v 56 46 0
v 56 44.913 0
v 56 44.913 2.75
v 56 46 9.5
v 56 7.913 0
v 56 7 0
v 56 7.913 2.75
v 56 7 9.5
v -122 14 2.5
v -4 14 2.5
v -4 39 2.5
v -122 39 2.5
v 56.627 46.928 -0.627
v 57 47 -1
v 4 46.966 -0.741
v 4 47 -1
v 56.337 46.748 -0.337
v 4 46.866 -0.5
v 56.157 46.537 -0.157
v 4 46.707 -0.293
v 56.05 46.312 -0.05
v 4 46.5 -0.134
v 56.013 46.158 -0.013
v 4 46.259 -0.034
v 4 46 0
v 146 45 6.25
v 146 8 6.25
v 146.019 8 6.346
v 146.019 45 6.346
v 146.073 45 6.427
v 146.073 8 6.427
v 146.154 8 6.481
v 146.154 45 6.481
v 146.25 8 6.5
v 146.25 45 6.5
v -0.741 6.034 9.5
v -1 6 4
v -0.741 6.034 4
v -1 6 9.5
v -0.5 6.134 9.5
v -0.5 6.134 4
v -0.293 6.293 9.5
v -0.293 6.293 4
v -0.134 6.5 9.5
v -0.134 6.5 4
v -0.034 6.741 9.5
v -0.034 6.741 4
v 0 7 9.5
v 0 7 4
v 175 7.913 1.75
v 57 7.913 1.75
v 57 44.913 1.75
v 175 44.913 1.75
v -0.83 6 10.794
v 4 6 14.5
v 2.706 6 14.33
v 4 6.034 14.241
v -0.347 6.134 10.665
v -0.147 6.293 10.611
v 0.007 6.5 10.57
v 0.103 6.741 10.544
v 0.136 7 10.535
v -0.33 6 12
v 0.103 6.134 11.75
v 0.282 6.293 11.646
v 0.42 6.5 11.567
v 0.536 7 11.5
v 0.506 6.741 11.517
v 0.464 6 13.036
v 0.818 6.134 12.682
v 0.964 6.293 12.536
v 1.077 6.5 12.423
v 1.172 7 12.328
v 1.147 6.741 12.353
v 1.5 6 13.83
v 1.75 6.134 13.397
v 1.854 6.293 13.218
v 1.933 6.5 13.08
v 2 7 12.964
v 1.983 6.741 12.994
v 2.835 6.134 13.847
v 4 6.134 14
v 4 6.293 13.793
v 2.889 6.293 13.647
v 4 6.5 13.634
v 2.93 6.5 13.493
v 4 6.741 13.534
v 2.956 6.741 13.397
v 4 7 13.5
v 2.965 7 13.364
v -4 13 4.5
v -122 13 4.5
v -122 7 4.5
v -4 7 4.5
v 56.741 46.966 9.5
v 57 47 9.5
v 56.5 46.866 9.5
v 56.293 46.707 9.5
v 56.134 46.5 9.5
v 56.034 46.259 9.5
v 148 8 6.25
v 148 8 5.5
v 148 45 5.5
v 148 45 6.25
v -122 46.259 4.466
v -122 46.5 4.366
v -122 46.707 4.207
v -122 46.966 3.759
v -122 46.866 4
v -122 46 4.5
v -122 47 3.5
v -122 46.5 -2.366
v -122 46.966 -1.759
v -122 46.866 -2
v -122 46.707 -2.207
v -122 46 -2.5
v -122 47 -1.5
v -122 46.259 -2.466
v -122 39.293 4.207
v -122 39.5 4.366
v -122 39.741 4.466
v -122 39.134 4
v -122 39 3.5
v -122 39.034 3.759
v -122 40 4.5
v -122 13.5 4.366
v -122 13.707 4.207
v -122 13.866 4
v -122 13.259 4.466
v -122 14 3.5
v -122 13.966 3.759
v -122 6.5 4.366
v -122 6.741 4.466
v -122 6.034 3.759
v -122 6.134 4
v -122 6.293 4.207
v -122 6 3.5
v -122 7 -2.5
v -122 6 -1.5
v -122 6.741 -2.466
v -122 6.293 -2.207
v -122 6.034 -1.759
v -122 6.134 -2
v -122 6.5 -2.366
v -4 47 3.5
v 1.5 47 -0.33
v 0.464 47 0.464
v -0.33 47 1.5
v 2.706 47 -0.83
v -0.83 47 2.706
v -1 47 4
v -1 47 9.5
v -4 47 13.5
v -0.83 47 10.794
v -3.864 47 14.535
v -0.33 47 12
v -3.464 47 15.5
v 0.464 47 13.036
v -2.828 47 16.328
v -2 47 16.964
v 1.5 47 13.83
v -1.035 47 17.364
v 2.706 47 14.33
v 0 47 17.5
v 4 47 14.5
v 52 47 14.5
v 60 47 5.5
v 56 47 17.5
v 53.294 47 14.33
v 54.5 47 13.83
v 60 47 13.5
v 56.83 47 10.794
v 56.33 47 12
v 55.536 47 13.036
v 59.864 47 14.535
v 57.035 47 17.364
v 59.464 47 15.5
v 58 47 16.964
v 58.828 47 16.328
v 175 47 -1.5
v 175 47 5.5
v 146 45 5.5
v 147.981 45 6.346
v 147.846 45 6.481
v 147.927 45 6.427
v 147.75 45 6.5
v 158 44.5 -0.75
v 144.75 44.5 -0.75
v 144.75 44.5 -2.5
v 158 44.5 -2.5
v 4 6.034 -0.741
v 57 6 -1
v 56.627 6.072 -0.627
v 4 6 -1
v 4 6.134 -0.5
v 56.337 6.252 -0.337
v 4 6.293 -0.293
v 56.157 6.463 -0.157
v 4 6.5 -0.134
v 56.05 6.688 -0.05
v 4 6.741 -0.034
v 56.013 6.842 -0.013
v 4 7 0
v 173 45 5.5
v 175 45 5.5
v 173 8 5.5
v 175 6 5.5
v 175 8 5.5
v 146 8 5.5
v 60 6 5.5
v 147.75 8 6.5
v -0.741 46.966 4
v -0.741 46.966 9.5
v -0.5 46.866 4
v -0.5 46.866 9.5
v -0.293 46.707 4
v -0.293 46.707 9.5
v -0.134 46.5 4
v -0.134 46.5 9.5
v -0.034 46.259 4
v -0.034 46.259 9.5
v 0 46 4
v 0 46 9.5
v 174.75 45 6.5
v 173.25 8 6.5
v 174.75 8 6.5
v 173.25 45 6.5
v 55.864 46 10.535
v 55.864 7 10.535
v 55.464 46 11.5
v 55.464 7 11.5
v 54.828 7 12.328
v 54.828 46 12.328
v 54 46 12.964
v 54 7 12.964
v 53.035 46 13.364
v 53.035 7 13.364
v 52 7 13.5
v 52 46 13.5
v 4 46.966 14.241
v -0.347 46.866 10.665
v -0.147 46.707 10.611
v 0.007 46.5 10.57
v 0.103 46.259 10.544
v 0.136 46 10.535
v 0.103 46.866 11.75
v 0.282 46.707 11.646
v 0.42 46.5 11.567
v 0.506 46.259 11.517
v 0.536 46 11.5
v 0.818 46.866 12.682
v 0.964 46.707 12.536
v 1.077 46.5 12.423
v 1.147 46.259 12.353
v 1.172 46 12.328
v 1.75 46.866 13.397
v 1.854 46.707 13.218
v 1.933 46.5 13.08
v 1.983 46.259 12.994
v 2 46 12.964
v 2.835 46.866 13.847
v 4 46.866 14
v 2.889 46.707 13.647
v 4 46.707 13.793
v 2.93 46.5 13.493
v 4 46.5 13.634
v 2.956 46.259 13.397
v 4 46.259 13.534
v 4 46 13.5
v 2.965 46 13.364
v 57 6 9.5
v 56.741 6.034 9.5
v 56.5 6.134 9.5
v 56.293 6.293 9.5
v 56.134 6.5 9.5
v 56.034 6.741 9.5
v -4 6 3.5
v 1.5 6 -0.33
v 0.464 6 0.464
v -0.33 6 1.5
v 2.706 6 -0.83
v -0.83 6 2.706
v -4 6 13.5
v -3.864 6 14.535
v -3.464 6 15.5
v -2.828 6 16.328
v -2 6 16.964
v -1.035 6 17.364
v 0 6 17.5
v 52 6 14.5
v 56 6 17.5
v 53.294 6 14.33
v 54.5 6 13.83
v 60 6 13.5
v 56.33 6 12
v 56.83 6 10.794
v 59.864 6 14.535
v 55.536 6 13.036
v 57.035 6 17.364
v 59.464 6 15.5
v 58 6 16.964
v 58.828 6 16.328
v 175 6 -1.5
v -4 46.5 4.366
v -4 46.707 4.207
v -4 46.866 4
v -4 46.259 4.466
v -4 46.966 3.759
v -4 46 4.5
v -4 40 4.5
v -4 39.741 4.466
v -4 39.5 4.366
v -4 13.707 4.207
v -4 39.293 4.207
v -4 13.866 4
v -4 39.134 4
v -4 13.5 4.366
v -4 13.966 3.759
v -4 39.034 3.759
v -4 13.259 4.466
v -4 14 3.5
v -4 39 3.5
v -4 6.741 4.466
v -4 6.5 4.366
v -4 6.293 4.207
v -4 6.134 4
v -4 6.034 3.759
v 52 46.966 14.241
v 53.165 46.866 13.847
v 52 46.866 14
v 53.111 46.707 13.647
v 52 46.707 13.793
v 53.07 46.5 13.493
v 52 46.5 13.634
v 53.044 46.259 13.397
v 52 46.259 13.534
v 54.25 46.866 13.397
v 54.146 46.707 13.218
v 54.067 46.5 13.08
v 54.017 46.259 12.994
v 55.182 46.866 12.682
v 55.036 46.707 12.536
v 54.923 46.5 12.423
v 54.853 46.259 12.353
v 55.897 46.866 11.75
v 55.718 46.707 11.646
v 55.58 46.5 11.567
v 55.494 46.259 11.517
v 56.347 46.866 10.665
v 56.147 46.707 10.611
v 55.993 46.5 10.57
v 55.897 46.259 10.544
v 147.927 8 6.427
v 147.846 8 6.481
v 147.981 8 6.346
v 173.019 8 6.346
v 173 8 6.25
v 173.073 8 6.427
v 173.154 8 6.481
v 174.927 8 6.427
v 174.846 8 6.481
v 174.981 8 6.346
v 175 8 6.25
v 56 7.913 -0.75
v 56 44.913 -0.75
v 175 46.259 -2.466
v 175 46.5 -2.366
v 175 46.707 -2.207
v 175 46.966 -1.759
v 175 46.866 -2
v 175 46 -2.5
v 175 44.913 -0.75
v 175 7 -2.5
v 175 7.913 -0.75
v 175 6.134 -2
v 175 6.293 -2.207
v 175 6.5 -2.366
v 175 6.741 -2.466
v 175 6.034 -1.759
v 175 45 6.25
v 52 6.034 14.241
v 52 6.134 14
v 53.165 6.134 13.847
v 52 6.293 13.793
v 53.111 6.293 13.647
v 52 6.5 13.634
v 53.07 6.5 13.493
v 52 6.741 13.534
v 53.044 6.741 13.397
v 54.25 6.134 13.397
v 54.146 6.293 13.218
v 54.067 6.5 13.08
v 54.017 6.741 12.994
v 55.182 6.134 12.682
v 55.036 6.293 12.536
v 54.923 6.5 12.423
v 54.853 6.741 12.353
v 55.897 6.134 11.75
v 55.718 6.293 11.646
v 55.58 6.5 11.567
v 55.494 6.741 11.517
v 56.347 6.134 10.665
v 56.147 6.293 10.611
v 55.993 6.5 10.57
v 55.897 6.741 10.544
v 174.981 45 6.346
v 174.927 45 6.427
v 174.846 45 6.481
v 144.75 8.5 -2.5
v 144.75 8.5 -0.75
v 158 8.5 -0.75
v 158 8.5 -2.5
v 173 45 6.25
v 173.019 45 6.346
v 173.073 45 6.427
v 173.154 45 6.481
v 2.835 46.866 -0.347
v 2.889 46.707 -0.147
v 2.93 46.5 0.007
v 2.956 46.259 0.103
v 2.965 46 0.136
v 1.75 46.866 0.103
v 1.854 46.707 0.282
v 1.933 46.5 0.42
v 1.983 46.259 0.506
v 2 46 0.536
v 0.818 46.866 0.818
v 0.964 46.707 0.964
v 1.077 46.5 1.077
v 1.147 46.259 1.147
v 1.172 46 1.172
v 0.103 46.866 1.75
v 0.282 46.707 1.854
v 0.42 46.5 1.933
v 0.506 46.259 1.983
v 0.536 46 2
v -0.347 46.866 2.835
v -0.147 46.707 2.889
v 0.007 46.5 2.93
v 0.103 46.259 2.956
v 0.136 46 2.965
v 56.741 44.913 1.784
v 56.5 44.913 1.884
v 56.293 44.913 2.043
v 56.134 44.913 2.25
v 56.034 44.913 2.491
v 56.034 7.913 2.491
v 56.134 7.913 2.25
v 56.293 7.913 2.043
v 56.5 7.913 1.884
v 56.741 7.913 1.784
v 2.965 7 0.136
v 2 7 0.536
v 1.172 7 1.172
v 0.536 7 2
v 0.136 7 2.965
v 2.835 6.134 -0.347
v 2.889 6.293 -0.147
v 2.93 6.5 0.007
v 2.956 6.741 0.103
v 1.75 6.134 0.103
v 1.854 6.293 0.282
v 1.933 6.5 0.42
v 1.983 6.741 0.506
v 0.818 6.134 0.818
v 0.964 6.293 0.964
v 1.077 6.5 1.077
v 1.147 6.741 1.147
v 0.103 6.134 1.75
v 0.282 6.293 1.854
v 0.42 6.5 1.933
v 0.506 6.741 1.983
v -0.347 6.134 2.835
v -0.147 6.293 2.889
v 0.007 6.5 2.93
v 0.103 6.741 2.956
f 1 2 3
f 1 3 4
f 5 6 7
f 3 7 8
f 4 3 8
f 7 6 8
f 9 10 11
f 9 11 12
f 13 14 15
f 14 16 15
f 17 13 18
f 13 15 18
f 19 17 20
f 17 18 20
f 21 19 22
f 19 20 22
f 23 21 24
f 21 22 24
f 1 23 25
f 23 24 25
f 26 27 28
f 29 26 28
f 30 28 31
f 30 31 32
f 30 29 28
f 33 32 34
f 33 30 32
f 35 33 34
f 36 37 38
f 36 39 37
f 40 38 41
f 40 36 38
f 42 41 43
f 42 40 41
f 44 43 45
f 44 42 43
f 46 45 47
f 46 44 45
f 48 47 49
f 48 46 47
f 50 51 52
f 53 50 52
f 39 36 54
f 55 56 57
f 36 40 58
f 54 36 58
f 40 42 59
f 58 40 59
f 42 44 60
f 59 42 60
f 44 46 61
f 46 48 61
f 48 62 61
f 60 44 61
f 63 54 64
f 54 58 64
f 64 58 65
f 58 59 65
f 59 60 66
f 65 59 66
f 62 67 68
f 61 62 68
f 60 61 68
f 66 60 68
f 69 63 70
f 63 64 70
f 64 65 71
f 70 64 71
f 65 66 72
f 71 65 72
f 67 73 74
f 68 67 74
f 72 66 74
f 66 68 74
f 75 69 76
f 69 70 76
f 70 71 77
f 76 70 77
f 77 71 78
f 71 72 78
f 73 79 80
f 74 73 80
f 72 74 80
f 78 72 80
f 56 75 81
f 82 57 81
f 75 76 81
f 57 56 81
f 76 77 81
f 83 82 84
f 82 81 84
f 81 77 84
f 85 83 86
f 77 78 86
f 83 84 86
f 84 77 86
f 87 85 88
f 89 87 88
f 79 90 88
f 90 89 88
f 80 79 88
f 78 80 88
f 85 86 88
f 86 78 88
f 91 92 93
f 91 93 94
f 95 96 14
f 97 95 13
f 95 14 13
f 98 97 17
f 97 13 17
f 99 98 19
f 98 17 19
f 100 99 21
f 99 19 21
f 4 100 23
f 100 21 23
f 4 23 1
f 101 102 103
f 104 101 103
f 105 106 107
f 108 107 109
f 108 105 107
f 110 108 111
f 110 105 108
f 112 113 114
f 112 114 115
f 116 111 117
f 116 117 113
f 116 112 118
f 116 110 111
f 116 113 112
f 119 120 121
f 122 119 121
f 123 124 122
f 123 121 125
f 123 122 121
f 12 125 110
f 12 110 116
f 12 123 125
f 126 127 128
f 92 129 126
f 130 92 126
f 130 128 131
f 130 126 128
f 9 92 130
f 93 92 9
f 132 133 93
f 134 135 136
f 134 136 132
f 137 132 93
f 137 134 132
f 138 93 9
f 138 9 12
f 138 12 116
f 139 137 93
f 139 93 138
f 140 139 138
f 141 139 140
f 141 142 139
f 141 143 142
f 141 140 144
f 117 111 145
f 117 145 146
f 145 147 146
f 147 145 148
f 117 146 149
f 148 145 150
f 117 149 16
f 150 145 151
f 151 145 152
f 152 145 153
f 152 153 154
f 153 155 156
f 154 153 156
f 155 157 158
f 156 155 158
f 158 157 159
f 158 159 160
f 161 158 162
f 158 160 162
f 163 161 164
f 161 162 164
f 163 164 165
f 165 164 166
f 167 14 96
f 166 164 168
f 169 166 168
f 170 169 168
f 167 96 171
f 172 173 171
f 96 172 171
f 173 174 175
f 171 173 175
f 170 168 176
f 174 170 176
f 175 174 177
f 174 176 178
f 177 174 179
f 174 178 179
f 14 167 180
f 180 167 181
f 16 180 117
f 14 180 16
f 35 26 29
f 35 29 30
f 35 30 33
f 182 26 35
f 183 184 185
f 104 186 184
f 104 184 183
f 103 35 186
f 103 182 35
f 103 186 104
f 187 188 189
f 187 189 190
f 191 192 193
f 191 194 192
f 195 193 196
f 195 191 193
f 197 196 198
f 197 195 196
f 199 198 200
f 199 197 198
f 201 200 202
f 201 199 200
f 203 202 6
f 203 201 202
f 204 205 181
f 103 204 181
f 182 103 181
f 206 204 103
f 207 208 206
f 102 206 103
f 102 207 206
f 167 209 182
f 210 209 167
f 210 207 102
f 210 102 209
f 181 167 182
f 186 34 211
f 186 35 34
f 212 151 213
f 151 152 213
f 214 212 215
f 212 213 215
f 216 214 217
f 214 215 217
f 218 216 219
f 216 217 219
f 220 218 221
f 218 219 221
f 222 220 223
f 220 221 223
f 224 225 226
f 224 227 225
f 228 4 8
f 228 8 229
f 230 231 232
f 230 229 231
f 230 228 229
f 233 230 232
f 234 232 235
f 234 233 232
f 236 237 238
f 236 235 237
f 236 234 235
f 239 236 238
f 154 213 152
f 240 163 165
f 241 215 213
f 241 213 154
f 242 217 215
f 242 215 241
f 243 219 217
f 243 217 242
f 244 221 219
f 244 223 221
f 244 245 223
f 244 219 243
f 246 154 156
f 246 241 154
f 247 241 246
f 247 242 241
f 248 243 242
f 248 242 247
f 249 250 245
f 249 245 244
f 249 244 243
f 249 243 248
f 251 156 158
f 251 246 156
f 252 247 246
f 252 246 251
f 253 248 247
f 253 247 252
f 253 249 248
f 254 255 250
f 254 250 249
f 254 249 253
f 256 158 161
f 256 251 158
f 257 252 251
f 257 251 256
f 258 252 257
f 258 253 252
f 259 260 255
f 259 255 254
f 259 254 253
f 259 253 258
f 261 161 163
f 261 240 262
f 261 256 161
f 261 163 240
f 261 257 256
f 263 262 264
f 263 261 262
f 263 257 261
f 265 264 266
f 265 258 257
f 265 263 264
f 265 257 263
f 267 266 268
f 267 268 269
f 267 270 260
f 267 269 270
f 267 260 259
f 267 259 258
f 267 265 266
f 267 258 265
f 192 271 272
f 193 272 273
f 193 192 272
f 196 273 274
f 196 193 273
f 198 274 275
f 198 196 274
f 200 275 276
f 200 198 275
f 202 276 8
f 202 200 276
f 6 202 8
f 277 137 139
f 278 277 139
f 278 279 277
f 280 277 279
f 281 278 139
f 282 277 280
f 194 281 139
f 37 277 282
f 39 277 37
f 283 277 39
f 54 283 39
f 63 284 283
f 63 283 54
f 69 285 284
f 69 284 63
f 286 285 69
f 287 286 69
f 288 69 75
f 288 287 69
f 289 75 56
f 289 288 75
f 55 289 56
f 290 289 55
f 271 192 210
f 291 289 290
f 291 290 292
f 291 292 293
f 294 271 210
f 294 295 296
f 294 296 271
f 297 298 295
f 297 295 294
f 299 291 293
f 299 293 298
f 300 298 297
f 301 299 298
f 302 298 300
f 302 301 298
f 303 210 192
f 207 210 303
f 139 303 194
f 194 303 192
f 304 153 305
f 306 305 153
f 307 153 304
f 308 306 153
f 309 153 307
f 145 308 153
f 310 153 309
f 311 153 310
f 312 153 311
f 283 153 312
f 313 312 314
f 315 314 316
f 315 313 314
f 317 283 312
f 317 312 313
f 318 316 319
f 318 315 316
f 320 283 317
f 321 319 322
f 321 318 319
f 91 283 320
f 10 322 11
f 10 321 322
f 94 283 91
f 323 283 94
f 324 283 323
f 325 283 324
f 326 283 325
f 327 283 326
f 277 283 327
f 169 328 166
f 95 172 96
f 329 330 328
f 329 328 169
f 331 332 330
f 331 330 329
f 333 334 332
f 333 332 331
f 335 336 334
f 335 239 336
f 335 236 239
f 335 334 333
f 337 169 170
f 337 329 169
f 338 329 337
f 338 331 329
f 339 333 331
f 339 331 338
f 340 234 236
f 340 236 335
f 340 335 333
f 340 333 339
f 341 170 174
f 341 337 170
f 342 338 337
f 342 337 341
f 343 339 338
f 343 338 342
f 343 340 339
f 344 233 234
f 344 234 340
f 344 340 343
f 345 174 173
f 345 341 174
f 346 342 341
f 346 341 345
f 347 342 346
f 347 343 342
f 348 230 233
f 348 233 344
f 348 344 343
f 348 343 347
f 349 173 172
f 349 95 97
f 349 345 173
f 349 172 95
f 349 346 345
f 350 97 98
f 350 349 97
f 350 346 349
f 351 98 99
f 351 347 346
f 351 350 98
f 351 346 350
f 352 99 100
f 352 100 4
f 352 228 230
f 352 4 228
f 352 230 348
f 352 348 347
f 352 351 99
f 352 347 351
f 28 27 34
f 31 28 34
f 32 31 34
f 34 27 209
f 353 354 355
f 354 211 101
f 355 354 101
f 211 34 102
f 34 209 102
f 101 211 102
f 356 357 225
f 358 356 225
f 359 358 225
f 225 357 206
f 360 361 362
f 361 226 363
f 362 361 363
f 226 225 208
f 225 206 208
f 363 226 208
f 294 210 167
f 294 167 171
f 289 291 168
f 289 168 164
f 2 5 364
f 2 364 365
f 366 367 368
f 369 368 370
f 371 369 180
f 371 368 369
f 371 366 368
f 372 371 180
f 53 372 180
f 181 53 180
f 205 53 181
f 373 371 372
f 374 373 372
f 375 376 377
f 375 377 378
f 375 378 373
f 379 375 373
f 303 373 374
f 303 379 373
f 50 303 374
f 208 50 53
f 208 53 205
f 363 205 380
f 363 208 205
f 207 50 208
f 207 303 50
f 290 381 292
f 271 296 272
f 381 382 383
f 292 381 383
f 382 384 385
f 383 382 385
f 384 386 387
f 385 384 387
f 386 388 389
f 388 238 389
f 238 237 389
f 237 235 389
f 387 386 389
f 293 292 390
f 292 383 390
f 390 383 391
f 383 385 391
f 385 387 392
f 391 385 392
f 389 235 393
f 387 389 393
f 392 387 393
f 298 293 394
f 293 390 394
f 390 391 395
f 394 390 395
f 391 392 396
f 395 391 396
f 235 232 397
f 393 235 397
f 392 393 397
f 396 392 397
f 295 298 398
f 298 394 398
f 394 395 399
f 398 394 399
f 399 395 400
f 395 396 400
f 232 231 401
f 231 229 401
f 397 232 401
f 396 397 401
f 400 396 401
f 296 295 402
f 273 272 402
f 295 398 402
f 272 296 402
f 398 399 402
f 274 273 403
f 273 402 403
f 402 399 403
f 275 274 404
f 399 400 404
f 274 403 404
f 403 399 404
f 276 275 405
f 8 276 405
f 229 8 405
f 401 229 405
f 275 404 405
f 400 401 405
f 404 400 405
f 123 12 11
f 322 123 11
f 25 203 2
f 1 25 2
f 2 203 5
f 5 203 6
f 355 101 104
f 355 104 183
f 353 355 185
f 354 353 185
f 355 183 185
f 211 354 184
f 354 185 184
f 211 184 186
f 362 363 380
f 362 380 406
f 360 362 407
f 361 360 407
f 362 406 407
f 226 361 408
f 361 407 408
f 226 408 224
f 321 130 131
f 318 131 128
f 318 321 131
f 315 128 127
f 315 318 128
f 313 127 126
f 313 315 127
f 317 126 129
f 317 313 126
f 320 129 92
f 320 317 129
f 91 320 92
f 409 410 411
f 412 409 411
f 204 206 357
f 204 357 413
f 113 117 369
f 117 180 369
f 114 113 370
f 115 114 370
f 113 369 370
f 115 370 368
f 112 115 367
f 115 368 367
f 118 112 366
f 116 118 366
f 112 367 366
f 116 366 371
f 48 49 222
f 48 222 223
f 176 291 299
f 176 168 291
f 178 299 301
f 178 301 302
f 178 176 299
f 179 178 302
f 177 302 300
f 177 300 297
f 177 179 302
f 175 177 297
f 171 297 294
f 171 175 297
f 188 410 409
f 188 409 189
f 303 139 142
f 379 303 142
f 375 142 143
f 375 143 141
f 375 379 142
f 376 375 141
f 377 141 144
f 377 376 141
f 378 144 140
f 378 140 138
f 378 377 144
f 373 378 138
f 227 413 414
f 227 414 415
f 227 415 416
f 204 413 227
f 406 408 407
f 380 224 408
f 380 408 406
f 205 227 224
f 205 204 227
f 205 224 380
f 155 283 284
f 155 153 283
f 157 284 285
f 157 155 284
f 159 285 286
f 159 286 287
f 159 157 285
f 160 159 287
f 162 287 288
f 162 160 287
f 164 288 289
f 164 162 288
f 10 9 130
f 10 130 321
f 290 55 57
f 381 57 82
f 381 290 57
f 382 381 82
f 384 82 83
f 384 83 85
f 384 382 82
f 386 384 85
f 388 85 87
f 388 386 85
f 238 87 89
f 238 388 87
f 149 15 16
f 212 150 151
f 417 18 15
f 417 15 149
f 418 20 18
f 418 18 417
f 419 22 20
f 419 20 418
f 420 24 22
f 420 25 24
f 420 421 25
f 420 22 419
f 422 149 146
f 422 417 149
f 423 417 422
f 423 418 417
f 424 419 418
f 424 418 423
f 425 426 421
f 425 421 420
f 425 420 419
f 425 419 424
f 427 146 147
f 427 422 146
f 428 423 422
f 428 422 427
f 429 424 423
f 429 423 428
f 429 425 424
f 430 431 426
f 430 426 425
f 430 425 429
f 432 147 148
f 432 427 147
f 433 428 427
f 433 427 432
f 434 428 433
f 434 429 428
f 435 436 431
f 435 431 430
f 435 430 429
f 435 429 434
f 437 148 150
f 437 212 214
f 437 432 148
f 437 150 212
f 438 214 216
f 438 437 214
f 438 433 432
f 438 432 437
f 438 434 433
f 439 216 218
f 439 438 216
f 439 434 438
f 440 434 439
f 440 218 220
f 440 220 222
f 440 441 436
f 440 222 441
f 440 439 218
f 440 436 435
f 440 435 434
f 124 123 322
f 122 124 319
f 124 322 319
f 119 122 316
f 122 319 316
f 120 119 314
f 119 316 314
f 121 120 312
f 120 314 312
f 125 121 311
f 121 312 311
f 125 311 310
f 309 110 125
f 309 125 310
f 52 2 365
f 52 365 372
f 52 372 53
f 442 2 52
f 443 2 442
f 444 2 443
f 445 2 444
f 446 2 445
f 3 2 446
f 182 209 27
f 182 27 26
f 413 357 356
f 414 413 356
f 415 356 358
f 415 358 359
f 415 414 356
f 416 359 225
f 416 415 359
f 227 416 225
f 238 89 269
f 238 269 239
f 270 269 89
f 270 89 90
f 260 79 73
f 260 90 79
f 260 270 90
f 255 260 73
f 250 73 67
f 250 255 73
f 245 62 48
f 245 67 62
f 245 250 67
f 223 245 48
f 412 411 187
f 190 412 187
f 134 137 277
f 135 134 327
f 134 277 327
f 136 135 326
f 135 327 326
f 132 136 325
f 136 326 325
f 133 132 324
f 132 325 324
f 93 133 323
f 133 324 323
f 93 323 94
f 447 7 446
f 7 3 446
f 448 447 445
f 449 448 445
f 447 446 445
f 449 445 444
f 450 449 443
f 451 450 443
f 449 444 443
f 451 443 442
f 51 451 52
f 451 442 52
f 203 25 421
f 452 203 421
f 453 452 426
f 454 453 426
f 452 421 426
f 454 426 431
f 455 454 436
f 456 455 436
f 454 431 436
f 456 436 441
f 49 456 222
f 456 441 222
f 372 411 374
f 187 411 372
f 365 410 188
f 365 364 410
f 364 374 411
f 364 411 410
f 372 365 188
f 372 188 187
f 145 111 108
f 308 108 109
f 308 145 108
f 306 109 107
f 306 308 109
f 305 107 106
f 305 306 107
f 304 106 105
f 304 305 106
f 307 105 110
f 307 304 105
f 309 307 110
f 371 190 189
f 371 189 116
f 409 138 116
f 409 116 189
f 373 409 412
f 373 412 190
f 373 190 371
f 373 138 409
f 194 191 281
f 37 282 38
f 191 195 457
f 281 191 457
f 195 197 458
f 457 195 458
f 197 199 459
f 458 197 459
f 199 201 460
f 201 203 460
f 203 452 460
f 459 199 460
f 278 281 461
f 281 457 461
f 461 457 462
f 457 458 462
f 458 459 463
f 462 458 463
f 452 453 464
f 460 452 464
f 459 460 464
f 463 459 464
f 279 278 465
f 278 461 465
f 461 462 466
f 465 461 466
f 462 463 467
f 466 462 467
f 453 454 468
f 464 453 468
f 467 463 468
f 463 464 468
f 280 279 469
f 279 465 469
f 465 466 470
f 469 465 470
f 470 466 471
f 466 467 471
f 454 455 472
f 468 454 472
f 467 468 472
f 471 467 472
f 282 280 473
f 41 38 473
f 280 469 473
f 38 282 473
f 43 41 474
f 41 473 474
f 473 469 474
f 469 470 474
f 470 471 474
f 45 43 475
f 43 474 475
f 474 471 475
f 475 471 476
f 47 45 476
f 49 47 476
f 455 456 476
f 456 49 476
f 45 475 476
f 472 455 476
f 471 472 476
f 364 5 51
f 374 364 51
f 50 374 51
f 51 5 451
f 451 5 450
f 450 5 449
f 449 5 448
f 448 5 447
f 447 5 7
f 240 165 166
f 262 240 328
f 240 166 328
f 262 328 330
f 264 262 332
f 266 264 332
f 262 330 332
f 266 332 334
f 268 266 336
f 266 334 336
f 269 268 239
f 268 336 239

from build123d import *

# Parameters (mm, degrees)
SKETCH037_W      = 2
SKETCH037_H      = 37
EXTRUDE036_DEPTH = 1
FILLET012_R      = 0.25
SKETCH038_W      = 13.25
SKETCH038_H      = 36
EXTRUDE037_DEPTH = 2
SKETCH031_W      = 37
SKETCH031_H      = 2.5
EXTRUDE029_DEPTH = 120
SKETCH030_W      = 56
SKETCH030_H      = 13.5
EXTRUDE028_DEPTH = 41
SKETCH036_W      = 120
SKETCH036_H      = 8
EXTRUDE035_DEPTH = 2
FILLET011_R      = 1
FILLET013_R      = 4
FILLET014_R      = 1


with BuildPart() as velcrobands:
    # Sketch037 → Extrude036 (new body)
    with BuildSketch(Plane.XY.offset(5.5)):
        with Locations((174, 26.5)):
            Rectangle(SKETCH037_W, SKETCH037_H)
        with Locations((147, 26.5)):
            Rectangle(SKETCH037_W, SKETCH037_H)
    extrude(amount=EXTRUDE036_DEPTH)

    # Fillet012
    fillet012_edges = [velcrobands.edges().sort_by_distance(p)[0] for p in [
        (148, 26.5, 6.5),
        (146, 26.5, 6.5),
        (173, 26.5, 6.5),
        (175, 26.5, 6.5),
    ]]
    fillet(fillet012_edges, radius=FILLET012_R)


with BuildPart() as sensorcuts:
    # Sketch038 → Extrude037 (new body)
    with BuildSketch(Plane.XY.offset(-0.75)):
        with Locations((151.375, 26.5)):
            Rectangle(SKETCH038_W, SKETCH038_H)
    extrude(amount=-EXTRUDE037_DEPTH)


with BuildPart() as extrude029:
    # Sketch031 → Extrude029 (new body)
    with BuildSketch(Plane.YZ.offset(56)):
        with Locations((26.412533, 0.5)):
            Rectangle(SKETCH031_W, SKETCH031_H)
    extrude(amount=EXTRUDE029_DEPTH)


with BuildPart() as band002:
    # Sketch030 → Extrude028 (new body)
    with BuildSketch(Plane.XZ.offset(-6)):
        Polygon((175, 5.5), (60, 5.5), (60, 17.5), (-4, 17.5), (-4, 2.5), (-122, 2.5), (-122, -2.5), (175, -2.5), align=None)
        with Locations((28, 6.75)):
            Rectangle(SKETCH030_W, SKETCH030_H, mode=Mode.SUBTRACT)
    extrude(amount=-EXTRUDE028_DEPTH)

    # Cut002: cut Extrude029
    add(extrude029.part, mode=Mode.SUBTRACT)

    # Cut005: cut sensorCuts
    add(sensorcuts.part, mode=Mode.SUBTRACT)


with BuildPart() as fillet014:
    # Sketch036 → Extrude035 (new body)
    with BuildSketch(Plane.XY.offset(2.5)):
        with Locations((-62, 43)):
            Rectangle(SKETCH036_W, SKETCH036_H)
        with Locations((-62, 10)):
            Rectangle(SKETCH036_W, SKETCH036_H)
    extrude(amount=EXTRUDE035_DEPTH)

    # Fillet011
    fillet011_edges = [fillet014.edges().sort_by_distance(p)[0] for p in [
        (-62, 14, 4.5),
        (-62, 6, 4.5),
        (-62, 47, 4.5),
        (-62, 39, 4.5),
    ]]
    fillet(fillet011_edges, radius=FILLET011_R)

    # Fusion011: union velcroBands, band002
    add(velcrobands.part)
    add(band002.part)

    # Fillet013
    fillet013_edges = [fillet014.edges().sort_by_distance(p)[0] for p in [
        (60, 26.5, 17.5),
        (-4, 26.5, 17.5),
        (0, 26.5, 0),
        (0, 26.5, 13.5),
        (56, 26.5, 13.5),
    ]]
    fillet(fillet013_edges, radius=FILLET013_R)

    # Fillet014
    fillet014_edges = [fillet014.edges().sort_by_distance(p)[0] for p in [
        (26.5, 6, -2.5),
        (28, 6, 13.5),
        (26.5, 47, -2.5),
        (28, 47, 13.5),
        (56, 26.412533, 1.75),
    ]]
    fillet(fillet014_edges, radius=FILLET014_R)


solid = fillet014.part
